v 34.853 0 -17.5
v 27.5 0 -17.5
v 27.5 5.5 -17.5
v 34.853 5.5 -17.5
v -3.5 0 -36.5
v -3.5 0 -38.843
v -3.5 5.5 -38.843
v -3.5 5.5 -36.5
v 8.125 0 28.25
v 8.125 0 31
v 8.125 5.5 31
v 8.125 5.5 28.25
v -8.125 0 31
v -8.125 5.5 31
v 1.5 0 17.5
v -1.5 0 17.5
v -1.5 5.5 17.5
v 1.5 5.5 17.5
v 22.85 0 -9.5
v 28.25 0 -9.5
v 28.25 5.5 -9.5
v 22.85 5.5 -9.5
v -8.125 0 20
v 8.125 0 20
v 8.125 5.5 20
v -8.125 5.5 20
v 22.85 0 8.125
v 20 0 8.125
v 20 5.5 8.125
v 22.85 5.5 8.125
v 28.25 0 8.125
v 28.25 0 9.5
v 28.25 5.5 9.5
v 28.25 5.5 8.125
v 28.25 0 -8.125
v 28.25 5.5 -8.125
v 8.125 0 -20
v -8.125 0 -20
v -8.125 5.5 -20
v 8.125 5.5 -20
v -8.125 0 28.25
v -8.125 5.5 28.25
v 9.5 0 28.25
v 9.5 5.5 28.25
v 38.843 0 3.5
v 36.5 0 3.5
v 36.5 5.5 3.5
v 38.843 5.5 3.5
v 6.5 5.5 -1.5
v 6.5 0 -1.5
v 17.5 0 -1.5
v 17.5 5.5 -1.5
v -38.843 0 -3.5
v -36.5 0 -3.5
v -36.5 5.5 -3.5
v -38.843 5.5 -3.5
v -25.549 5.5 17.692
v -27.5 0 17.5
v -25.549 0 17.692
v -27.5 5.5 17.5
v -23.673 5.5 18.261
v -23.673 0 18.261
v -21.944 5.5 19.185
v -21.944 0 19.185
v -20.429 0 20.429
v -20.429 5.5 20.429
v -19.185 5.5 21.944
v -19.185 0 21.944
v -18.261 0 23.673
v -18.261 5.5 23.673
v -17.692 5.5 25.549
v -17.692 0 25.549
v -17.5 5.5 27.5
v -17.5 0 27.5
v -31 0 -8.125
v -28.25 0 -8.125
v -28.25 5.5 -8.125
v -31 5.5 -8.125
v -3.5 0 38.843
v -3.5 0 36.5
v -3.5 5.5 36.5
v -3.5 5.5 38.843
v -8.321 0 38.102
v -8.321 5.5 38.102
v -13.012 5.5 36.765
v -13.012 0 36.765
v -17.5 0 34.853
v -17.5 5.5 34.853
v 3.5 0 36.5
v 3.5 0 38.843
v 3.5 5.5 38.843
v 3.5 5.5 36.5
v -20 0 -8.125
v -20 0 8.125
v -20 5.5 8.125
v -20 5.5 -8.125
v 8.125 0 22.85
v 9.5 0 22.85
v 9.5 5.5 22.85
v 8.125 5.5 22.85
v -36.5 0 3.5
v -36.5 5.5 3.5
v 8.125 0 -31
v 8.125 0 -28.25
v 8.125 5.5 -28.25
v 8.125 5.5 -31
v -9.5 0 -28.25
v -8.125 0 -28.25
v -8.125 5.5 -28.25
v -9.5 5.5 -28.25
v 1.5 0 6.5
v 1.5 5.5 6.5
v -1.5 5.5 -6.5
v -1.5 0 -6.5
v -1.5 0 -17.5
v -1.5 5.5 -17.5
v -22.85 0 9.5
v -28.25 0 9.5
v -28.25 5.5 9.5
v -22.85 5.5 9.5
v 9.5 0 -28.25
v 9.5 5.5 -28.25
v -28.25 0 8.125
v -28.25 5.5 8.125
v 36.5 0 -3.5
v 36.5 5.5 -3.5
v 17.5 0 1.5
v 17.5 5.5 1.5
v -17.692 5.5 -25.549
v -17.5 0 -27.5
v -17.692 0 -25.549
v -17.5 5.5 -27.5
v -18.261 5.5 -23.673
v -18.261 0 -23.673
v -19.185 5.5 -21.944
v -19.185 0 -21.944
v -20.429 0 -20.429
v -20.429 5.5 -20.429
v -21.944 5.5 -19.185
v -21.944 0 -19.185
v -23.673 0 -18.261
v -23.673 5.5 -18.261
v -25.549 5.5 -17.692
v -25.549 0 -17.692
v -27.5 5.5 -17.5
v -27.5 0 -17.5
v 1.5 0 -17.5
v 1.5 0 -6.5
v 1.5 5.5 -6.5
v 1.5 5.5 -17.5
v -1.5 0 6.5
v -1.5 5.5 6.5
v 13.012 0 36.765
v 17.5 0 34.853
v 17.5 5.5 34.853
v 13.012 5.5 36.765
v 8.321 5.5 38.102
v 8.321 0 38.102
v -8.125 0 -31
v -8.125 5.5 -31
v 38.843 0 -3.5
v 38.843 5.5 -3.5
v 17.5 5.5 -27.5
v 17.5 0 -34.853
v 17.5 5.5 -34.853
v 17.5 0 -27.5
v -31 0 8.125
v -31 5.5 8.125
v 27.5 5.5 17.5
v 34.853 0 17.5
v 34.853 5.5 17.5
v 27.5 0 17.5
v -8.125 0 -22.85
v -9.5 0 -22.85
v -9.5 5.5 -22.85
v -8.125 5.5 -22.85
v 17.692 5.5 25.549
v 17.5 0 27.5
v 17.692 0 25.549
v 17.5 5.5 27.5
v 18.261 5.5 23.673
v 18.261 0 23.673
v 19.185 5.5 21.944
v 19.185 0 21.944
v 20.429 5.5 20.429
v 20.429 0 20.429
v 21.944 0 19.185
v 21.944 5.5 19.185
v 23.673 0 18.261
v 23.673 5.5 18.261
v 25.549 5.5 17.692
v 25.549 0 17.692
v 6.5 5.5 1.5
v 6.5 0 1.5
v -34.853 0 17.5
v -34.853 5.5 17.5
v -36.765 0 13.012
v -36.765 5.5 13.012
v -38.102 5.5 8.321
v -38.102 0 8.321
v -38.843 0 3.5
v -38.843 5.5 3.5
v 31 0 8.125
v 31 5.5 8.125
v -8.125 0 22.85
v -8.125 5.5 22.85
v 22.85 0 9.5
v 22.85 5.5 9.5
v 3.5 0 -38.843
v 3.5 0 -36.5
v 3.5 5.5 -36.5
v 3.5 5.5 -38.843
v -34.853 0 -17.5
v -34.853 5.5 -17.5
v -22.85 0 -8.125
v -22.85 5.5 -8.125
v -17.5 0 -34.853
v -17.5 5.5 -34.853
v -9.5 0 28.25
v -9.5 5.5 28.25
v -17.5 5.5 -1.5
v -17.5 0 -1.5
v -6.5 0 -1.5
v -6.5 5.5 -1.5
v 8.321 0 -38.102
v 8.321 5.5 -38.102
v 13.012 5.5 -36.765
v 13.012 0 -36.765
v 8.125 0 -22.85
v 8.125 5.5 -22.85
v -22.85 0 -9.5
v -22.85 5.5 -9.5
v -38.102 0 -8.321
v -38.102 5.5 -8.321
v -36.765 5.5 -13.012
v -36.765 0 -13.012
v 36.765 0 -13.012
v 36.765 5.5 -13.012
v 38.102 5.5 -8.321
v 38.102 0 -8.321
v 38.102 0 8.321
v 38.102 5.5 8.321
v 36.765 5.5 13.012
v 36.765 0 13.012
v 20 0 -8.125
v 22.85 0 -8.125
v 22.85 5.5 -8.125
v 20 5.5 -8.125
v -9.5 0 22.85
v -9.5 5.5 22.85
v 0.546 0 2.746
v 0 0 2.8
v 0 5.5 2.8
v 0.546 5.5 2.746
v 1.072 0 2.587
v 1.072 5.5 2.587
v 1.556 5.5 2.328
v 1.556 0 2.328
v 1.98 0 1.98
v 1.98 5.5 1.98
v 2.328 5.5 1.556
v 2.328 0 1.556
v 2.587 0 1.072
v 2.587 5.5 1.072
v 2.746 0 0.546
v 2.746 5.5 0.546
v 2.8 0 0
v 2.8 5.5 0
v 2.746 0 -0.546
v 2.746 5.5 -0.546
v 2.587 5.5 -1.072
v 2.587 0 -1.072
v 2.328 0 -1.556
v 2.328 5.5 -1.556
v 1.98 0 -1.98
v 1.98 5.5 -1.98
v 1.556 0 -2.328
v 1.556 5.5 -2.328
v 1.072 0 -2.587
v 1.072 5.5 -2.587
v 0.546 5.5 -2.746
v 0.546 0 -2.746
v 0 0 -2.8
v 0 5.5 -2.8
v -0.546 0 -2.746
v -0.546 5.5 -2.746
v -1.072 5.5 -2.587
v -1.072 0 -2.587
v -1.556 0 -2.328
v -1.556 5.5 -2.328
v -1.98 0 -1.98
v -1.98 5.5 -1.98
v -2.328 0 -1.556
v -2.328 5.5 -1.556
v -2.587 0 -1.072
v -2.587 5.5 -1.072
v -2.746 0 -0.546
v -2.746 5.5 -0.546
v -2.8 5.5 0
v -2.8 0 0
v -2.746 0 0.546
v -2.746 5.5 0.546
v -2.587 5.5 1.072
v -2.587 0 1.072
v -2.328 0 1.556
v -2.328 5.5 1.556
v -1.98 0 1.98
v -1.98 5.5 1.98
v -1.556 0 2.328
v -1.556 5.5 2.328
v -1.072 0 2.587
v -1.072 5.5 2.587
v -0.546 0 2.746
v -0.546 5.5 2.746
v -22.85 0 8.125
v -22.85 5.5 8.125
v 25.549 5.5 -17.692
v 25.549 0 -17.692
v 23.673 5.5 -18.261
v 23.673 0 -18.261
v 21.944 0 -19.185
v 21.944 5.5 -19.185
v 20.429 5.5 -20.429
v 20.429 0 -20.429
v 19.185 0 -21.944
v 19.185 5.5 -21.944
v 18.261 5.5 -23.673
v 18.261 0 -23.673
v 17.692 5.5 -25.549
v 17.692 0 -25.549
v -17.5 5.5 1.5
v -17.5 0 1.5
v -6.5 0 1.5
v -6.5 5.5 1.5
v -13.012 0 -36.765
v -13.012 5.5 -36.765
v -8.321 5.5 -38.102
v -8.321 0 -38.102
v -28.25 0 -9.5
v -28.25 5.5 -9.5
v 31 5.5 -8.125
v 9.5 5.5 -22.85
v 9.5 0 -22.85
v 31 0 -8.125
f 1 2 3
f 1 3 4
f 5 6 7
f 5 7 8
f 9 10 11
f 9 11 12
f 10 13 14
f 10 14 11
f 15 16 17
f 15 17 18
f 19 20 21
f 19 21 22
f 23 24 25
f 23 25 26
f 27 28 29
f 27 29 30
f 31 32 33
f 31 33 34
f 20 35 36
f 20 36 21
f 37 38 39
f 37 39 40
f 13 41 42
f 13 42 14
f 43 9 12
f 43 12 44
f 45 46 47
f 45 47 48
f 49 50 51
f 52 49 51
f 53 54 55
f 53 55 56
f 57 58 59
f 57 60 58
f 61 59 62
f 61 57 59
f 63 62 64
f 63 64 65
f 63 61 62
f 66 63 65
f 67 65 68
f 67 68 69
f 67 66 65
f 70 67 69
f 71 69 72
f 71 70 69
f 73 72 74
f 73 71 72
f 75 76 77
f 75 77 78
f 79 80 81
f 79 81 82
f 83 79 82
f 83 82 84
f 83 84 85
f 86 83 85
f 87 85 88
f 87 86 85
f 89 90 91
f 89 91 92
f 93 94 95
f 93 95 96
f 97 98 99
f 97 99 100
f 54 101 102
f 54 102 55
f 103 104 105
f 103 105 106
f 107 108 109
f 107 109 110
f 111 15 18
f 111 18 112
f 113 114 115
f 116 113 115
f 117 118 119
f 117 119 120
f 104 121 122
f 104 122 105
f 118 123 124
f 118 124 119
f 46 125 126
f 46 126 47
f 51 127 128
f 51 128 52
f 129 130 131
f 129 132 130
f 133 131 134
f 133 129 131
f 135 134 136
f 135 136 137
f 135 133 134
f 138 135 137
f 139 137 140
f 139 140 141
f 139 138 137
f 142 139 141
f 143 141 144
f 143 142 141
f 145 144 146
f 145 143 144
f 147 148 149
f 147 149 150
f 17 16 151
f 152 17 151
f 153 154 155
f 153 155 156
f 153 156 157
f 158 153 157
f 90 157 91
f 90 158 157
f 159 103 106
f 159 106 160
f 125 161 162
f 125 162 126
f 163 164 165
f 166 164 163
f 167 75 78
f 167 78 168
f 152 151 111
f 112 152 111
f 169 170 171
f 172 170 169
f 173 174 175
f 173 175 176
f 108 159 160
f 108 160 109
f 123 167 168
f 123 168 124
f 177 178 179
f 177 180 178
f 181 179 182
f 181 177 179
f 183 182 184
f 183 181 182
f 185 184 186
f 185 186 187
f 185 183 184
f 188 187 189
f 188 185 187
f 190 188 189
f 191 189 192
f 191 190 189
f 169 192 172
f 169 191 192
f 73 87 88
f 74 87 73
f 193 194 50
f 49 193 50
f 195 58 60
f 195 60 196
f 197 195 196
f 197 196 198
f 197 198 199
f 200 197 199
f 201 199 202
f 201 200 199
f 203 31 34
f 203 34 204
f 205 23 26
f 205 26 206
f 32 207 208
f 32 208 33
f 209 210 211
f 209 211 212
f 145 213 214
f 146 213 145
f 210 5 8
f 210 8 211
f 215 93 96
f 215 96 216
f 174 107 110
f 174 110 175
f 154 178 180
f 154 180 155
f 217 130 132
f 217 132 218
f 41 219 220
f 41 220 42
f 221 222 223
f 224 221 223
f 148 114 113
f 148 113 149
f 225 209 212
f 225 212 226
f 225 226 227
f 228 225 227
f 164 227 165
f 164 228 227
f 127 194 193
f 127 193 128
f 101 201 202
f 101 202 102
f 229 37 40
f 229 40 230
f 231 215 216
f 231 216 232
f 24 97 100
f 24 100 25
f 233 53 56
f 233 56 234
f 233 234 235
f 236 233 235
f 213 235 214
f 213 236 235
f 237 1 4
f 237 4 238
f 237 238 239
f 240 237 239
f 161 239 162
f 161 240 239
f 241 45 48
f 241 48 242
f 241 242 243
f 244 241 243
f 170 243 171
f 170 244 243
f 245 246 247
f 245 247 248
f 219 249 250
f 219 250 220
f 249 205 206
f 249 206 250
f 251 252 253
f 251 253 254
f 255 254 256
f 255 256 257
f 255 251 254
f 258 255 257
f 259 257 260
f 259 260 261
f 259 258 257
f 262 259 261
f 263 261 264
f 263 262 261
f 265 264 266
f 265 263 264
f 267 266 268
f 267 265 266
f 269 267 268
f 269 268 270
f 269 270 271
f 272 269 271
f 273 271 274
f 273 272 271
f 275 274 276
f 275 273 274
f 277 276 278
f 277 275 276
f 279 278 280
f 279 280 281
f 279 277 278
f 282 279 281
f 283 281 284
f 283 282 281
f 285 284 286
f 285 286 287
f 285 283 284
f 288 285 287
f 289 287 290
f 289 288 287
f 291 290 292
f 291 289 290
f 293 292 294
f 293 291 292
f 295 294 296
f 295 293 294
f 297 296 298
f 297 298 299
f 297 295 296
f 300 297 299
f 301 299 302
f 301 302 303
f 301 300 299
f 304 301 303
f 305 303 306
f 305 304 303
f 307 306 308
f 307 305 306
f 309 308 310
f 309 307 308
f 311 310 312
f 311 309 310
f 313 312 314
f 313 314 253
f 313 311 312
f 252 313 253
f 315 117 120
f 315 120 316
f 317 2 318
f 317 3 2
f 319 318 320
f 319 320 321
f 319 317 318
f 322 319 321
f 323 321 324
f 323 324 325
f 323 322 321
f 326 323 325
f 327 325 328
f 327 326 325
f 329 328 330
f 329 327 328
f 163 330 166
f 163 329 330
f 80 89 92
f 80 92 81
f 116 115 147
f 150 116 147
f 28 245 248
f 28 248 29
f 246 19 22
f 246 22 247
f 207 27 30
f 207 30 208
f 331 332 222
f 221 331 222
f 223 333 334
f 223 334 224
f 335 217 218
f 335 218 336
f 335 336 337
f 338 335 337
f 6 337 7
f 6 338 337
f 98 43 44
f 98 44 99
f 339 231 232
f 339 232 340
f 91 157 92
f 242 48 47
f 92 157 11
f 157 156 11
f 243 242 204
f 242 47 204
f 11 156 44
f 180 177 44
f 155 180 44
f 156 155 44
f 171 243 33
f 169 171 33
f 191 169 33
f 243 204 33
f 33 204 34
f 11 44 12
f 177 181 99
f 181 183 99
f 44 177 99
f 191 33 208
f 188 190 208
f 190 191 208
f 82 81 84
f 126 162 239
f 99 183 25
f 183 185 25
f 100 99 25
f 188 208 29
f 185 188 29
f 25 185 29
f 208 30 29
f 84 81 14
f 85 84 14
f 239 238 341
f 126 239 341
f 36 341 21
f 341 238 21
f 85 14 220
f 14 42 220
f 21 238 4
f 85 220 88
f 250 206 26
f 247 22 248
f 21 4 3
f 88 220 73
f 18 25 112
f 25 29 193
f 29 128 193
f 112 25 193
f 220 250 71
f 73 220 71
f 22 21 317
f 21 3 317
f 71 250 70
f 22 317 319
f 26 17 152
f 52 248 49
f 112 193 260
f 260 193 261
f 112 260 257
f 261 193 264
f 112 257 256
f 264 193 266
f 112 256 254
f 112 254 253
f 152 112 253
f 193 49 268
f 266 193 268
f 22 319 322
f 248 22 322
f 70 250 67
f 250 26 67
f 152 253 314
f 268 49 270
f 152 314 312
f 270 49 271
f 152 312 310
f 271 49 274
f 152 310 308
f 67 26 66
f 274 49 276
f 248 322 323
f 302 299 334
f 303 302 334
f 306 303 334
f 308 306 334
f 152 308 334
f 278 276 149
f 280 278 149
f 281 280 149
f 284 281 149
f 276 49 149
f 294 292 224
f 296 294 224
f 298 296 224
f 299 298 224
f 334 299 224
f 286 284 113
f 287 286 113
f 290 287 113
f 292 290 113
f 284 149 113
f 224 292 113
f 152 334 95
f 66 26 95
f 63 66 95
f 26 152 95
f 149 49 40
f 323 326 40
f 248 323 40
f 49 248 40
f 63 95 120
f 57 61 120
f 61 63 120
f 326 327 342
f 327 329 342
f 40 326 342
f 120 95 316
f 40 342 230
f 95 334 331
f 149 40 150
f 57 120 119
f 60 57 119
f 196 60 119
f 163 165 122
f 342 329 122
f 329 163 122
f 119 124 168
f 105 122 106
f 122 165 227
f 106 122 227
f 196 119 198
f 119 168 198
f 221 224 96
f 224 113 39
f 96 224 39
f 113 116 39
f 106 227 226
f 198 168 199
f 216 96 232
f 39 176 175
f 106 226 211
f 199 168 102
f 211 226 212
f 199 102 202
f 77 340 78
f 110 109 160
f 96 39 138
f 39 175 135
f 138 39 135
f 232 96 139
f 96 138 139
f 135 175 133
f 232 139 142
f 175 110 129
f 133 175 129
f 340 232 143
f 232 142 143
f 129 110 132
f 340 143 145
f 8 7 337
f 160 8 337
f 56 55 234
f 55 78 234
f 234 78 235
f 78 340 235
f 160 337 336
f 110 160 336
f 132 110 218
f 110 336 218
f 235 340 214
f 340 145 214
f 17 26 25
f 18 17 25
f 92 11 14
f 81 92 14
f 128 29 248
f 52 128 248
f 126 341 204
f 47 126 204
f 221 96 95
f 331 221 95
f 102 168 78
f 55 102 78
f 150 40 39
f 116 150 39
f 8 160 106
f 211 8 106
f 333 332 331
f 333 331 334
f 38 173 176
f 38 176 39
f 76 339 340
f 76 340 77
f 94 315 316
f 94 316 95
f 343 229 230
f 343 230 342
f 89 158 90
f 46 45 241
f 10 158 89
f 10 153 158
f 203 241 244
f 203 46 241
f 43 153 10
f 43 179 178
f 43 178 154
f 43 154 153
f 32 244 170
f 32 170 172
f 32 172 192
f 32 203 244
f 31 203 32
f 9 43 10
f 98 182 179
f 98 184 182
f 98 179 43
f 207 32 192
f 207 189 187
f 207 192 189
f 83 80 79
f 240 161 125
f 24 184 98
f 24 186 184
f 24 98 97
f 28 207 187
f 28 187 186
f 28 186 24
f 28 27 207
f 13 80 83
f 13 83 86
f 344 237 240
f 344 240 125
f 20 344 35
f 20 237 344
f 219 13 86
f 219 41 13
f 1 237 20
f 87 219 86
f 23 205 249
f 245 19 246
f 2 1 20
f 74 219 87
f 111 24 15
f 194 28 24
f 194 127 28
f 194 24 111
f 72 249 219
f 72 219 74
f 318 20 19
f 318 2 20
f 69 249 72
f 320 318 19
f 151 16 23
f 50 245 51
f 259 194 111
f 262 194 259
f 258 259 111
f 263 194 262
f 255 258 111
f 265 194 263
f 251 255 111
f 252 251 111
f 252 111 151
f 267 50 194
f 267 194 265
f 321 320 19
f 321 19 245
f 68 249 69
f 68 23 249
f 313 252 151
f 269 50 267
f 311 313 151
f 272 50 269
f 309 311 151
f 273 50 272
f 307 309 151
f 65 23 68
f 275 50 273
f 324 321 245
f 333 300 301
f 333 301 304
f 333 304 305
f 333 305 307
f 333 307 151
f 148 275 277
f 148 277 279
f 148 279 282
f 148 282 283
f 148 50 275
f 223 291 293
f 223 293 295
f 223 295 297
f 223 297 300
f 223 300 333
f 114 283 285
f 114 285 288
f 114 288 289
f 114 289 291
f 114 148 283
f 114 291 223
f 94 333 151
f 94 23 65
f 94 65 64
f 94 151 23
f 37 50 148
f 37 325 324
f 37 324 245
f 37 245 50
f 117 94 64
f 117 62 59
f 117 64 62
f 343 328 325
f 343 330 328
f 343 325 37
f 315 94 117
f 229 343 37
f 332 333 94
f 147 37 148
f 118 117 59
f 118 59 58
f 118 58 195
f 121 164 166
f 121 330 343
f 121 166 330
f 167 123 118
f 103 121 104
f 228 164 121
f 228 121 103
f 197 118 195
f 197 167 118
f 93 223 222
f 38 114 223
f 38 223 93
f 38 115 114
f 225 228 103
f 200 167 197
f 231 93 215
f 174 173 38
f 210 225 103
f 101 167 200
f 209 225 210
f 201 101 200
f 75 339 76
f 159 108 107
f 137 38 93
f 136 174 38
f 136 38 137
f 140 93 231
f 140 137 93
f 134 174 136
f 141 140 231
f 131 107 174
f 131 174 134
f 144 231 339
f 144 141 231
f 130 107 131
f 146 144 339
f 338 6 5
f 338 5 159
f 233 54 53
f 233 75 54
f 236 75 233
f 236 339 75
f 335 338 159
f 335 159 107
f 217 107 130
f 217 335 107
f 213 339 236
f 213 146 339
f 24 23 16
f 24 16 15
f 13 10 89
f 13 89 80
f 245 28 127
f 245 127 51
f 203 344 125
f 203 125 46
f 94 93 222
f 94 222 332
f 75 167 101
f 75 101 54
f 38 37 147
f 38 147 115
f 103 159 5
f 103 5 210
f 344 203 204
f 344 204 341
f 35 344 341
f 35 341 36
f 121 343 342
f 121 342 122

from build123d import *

# Parameters (mm, degrees)
SKETCH1_R           = 2.8
SKETCH1_W           = 3
SKETCH1_H           = 11
SKETCH1_W_2         = 11
SKETCH1_H_2         = 3
BOSS_EXTRUDE1_DEPTH = 5.5
FILLET1_R           = 10
FILLET2_R           = 10
FILLET3_R           = 10
FILLET4_R           = 10


with BuildPart() as part:
    # Sketch1 → Boss-Extrude1 (new body)
    with BuildSketch(Plane(origin=(0, 0, 0), x_dir=(1, 0, 0), z_dir=(0, 1, 0))):
        with BuildLine():
            Line((-3.5, 38.842631219), (-3.5, 36.5))
            Line((-3.5, 36.5), (3.5, 36.5))
            Line((3.5, 36.5), (3.5, 38.842631219))
            ThreePointArc((3.5, 38.842631219), (10.687785693, 37.506949182), (17.5, 34.853263836))
            Line((17.5, 34.853263836), (17.5, 17.5))
            Line((17.5, 17.5), (34.853263836, 17.5))
            ThreePointArc((34.853263836, 17.5), (37.506949182, 10.687785693), (38.842631219, 3.5))
            Line((38.842631219, 3.5), (36.5, 3.5))
            Line((36.5, 3.5), (36.5, -3.5))
            Line((36.5, -3.5), (38.842631219, -3.5))
            ThreePointArc((38.842631219, -3.5), (37.506949182, -10.687785693), (34.853263836, -17.5))
            Line((34.853263836, -17.5), (17.5, -17.5))
            Line((17.5, -17.5), (17.5, -34.853263836))
            ThreePointArc((17.5, -34.853263836), (10.687785693, -37.506949182), (3.5, -38.842631219))
            Line((3.5, -38.842631219), (3.5, -36.5))
            Line((3.5, -36.5), (-3.5, -36.5))
            Line((-3.5, -36.5), (-3.5, -38.842631219))
            ThreePointArc((-3.5, -38.842631219), (-10.687785693, -37.506949182), (-17.5, -34.853263836))
            Line((-17.5, -34.853263836), (-17.5, -17.5))
            Line((-17.5, -17.5), (-34.853263836, -17.5))
            ThreePointArc((-34.853263836, -17.5), (-37.506949182, -10.687785693), (-38.842631219, -3.5))
            Line((-38.842631219, -3.5), (-36.5, -3.5))
            Line((-36.5, -3.5), (-36.5, 3.5))
            Line((-36.5, 3.5), (-38.842631219, 3.5))
            ThreePointArc((-38.842631219, 3.5), (-37.506949182, 10.687785693), (-34.853263836, 17.5))
            Line((-34.853263836, 17.5), (-17.5, 17.5))
            Line((-17.5, 17.5), (-17.5, 34.853263836))
            ThreePointArc((-17.5, 34.853263836), (-10.687785693, 37.506949182), (-3.5, 38.842631219))
        make_face()
        with Locations(Location((0, 0, 0), (0, 0, 270))):
            Circle(SKETCH1_R, mode=Mode.SUBTRACT)
        Polygon((-8.125, 22.85), (-8.125, 20), (8.125, 20), (8.125, 22.85), (9.5, 22.85), (9.5, 28.25), (8.125, 28.25), (8.125, 31), (-8.125, 31), (-8.125, 28.25), (-9.5, 28.25), (-9.5, 22.85), align=None, mode=Mode.SUBTRACT)
        with Locations((0, 12)):
            Rectangle(SKETCH1_W, SKETCH1_H, mode=Mode.SUBTRACT)
        Polygon((22.85, 8.125), (20, 8.125), (20, -8.125), (22.85, -8.125), (22.85, -9.5), (28.25, -9.5), (28.25, -8.125), (31, -8.125), (31, 8.125), (28.25, 8.125), (28.25, 9.5), (22.85, 9.5), align=None, mode=Mode.SUBTRACT)
        with Locations((12, 0)):
            Rectangle(SKETCH1_W_2, SKETCH1_H_2, mode=Mode.SUBTRACT)
        Polygon((8.125, -22.85), (8.125, -20), (-8.125, -20), (-8.125, -22.85), (-9.5, -22.85), (-9.5, -28.25), (-8.125, -28.25), (-8.125, -31), (8.125, -31), (8.125, -28.25), (9.5, -28.25), (9.5, -22.85), align=None, mode=Mode.SUBTRACT)
        with Locations((0, -12)):
            Rectangle(SKETCH1_W, SKETCH1_H, mode=Mode.SUBTRACT)
        Polygon((-22.85, -8.125), (-20, -8.125), (-20, 8.125), (-22.85, 8.125), (-22.85, 9.5), (-28.25, 9.5), (-28.25, 8.125), (-31, 8.125), (-31, -8.125), (-28.25, -8.125), (-28.25, -9.5), (-22.85, -9.5), align=None, mode=Mode.SUBTRACT)
        with Locations((-12, 0)):
            Rectangle(SKETCH1_W_2, SKETCH1_H_2, mode=Mode.SUBTRACT)
    extrude(amount=BOSS_EXTRUDE1_DEPTH)

    # Fillet1
    fillet1_edges = [part.edges().sort_by_distance(p)[0] for p in [
        (-17.5, 2.75, 17.5),
    ]]
    fillet(fillet1_edges, radius=FILLET1_R)

    # Fillet2
    fillet2_edges = [part.edges().sort_by_distance(p)[0] for p in [
        (17.5, 2.75, 17.5),
    ]]
    fillet(fillet2_edges, radius=FILLET2_R)

    # Fillet3
    fillet3_edges = [part.edges().sort_by_distance(p)[0] for p in [
        (17.5, 2.75, -17.5),
    ]]
    fillet(fillet3_edges, radius=FILLET3_R)

    # Fillet4
    fillet4_edges = [part.edges().sort_by_distance(p)[0] for p in [
        (-17.5, 2.75, -17.5),
    ]]
    fillet(fillet4_edges, radius=FILLET4_R)


solid = part.part
